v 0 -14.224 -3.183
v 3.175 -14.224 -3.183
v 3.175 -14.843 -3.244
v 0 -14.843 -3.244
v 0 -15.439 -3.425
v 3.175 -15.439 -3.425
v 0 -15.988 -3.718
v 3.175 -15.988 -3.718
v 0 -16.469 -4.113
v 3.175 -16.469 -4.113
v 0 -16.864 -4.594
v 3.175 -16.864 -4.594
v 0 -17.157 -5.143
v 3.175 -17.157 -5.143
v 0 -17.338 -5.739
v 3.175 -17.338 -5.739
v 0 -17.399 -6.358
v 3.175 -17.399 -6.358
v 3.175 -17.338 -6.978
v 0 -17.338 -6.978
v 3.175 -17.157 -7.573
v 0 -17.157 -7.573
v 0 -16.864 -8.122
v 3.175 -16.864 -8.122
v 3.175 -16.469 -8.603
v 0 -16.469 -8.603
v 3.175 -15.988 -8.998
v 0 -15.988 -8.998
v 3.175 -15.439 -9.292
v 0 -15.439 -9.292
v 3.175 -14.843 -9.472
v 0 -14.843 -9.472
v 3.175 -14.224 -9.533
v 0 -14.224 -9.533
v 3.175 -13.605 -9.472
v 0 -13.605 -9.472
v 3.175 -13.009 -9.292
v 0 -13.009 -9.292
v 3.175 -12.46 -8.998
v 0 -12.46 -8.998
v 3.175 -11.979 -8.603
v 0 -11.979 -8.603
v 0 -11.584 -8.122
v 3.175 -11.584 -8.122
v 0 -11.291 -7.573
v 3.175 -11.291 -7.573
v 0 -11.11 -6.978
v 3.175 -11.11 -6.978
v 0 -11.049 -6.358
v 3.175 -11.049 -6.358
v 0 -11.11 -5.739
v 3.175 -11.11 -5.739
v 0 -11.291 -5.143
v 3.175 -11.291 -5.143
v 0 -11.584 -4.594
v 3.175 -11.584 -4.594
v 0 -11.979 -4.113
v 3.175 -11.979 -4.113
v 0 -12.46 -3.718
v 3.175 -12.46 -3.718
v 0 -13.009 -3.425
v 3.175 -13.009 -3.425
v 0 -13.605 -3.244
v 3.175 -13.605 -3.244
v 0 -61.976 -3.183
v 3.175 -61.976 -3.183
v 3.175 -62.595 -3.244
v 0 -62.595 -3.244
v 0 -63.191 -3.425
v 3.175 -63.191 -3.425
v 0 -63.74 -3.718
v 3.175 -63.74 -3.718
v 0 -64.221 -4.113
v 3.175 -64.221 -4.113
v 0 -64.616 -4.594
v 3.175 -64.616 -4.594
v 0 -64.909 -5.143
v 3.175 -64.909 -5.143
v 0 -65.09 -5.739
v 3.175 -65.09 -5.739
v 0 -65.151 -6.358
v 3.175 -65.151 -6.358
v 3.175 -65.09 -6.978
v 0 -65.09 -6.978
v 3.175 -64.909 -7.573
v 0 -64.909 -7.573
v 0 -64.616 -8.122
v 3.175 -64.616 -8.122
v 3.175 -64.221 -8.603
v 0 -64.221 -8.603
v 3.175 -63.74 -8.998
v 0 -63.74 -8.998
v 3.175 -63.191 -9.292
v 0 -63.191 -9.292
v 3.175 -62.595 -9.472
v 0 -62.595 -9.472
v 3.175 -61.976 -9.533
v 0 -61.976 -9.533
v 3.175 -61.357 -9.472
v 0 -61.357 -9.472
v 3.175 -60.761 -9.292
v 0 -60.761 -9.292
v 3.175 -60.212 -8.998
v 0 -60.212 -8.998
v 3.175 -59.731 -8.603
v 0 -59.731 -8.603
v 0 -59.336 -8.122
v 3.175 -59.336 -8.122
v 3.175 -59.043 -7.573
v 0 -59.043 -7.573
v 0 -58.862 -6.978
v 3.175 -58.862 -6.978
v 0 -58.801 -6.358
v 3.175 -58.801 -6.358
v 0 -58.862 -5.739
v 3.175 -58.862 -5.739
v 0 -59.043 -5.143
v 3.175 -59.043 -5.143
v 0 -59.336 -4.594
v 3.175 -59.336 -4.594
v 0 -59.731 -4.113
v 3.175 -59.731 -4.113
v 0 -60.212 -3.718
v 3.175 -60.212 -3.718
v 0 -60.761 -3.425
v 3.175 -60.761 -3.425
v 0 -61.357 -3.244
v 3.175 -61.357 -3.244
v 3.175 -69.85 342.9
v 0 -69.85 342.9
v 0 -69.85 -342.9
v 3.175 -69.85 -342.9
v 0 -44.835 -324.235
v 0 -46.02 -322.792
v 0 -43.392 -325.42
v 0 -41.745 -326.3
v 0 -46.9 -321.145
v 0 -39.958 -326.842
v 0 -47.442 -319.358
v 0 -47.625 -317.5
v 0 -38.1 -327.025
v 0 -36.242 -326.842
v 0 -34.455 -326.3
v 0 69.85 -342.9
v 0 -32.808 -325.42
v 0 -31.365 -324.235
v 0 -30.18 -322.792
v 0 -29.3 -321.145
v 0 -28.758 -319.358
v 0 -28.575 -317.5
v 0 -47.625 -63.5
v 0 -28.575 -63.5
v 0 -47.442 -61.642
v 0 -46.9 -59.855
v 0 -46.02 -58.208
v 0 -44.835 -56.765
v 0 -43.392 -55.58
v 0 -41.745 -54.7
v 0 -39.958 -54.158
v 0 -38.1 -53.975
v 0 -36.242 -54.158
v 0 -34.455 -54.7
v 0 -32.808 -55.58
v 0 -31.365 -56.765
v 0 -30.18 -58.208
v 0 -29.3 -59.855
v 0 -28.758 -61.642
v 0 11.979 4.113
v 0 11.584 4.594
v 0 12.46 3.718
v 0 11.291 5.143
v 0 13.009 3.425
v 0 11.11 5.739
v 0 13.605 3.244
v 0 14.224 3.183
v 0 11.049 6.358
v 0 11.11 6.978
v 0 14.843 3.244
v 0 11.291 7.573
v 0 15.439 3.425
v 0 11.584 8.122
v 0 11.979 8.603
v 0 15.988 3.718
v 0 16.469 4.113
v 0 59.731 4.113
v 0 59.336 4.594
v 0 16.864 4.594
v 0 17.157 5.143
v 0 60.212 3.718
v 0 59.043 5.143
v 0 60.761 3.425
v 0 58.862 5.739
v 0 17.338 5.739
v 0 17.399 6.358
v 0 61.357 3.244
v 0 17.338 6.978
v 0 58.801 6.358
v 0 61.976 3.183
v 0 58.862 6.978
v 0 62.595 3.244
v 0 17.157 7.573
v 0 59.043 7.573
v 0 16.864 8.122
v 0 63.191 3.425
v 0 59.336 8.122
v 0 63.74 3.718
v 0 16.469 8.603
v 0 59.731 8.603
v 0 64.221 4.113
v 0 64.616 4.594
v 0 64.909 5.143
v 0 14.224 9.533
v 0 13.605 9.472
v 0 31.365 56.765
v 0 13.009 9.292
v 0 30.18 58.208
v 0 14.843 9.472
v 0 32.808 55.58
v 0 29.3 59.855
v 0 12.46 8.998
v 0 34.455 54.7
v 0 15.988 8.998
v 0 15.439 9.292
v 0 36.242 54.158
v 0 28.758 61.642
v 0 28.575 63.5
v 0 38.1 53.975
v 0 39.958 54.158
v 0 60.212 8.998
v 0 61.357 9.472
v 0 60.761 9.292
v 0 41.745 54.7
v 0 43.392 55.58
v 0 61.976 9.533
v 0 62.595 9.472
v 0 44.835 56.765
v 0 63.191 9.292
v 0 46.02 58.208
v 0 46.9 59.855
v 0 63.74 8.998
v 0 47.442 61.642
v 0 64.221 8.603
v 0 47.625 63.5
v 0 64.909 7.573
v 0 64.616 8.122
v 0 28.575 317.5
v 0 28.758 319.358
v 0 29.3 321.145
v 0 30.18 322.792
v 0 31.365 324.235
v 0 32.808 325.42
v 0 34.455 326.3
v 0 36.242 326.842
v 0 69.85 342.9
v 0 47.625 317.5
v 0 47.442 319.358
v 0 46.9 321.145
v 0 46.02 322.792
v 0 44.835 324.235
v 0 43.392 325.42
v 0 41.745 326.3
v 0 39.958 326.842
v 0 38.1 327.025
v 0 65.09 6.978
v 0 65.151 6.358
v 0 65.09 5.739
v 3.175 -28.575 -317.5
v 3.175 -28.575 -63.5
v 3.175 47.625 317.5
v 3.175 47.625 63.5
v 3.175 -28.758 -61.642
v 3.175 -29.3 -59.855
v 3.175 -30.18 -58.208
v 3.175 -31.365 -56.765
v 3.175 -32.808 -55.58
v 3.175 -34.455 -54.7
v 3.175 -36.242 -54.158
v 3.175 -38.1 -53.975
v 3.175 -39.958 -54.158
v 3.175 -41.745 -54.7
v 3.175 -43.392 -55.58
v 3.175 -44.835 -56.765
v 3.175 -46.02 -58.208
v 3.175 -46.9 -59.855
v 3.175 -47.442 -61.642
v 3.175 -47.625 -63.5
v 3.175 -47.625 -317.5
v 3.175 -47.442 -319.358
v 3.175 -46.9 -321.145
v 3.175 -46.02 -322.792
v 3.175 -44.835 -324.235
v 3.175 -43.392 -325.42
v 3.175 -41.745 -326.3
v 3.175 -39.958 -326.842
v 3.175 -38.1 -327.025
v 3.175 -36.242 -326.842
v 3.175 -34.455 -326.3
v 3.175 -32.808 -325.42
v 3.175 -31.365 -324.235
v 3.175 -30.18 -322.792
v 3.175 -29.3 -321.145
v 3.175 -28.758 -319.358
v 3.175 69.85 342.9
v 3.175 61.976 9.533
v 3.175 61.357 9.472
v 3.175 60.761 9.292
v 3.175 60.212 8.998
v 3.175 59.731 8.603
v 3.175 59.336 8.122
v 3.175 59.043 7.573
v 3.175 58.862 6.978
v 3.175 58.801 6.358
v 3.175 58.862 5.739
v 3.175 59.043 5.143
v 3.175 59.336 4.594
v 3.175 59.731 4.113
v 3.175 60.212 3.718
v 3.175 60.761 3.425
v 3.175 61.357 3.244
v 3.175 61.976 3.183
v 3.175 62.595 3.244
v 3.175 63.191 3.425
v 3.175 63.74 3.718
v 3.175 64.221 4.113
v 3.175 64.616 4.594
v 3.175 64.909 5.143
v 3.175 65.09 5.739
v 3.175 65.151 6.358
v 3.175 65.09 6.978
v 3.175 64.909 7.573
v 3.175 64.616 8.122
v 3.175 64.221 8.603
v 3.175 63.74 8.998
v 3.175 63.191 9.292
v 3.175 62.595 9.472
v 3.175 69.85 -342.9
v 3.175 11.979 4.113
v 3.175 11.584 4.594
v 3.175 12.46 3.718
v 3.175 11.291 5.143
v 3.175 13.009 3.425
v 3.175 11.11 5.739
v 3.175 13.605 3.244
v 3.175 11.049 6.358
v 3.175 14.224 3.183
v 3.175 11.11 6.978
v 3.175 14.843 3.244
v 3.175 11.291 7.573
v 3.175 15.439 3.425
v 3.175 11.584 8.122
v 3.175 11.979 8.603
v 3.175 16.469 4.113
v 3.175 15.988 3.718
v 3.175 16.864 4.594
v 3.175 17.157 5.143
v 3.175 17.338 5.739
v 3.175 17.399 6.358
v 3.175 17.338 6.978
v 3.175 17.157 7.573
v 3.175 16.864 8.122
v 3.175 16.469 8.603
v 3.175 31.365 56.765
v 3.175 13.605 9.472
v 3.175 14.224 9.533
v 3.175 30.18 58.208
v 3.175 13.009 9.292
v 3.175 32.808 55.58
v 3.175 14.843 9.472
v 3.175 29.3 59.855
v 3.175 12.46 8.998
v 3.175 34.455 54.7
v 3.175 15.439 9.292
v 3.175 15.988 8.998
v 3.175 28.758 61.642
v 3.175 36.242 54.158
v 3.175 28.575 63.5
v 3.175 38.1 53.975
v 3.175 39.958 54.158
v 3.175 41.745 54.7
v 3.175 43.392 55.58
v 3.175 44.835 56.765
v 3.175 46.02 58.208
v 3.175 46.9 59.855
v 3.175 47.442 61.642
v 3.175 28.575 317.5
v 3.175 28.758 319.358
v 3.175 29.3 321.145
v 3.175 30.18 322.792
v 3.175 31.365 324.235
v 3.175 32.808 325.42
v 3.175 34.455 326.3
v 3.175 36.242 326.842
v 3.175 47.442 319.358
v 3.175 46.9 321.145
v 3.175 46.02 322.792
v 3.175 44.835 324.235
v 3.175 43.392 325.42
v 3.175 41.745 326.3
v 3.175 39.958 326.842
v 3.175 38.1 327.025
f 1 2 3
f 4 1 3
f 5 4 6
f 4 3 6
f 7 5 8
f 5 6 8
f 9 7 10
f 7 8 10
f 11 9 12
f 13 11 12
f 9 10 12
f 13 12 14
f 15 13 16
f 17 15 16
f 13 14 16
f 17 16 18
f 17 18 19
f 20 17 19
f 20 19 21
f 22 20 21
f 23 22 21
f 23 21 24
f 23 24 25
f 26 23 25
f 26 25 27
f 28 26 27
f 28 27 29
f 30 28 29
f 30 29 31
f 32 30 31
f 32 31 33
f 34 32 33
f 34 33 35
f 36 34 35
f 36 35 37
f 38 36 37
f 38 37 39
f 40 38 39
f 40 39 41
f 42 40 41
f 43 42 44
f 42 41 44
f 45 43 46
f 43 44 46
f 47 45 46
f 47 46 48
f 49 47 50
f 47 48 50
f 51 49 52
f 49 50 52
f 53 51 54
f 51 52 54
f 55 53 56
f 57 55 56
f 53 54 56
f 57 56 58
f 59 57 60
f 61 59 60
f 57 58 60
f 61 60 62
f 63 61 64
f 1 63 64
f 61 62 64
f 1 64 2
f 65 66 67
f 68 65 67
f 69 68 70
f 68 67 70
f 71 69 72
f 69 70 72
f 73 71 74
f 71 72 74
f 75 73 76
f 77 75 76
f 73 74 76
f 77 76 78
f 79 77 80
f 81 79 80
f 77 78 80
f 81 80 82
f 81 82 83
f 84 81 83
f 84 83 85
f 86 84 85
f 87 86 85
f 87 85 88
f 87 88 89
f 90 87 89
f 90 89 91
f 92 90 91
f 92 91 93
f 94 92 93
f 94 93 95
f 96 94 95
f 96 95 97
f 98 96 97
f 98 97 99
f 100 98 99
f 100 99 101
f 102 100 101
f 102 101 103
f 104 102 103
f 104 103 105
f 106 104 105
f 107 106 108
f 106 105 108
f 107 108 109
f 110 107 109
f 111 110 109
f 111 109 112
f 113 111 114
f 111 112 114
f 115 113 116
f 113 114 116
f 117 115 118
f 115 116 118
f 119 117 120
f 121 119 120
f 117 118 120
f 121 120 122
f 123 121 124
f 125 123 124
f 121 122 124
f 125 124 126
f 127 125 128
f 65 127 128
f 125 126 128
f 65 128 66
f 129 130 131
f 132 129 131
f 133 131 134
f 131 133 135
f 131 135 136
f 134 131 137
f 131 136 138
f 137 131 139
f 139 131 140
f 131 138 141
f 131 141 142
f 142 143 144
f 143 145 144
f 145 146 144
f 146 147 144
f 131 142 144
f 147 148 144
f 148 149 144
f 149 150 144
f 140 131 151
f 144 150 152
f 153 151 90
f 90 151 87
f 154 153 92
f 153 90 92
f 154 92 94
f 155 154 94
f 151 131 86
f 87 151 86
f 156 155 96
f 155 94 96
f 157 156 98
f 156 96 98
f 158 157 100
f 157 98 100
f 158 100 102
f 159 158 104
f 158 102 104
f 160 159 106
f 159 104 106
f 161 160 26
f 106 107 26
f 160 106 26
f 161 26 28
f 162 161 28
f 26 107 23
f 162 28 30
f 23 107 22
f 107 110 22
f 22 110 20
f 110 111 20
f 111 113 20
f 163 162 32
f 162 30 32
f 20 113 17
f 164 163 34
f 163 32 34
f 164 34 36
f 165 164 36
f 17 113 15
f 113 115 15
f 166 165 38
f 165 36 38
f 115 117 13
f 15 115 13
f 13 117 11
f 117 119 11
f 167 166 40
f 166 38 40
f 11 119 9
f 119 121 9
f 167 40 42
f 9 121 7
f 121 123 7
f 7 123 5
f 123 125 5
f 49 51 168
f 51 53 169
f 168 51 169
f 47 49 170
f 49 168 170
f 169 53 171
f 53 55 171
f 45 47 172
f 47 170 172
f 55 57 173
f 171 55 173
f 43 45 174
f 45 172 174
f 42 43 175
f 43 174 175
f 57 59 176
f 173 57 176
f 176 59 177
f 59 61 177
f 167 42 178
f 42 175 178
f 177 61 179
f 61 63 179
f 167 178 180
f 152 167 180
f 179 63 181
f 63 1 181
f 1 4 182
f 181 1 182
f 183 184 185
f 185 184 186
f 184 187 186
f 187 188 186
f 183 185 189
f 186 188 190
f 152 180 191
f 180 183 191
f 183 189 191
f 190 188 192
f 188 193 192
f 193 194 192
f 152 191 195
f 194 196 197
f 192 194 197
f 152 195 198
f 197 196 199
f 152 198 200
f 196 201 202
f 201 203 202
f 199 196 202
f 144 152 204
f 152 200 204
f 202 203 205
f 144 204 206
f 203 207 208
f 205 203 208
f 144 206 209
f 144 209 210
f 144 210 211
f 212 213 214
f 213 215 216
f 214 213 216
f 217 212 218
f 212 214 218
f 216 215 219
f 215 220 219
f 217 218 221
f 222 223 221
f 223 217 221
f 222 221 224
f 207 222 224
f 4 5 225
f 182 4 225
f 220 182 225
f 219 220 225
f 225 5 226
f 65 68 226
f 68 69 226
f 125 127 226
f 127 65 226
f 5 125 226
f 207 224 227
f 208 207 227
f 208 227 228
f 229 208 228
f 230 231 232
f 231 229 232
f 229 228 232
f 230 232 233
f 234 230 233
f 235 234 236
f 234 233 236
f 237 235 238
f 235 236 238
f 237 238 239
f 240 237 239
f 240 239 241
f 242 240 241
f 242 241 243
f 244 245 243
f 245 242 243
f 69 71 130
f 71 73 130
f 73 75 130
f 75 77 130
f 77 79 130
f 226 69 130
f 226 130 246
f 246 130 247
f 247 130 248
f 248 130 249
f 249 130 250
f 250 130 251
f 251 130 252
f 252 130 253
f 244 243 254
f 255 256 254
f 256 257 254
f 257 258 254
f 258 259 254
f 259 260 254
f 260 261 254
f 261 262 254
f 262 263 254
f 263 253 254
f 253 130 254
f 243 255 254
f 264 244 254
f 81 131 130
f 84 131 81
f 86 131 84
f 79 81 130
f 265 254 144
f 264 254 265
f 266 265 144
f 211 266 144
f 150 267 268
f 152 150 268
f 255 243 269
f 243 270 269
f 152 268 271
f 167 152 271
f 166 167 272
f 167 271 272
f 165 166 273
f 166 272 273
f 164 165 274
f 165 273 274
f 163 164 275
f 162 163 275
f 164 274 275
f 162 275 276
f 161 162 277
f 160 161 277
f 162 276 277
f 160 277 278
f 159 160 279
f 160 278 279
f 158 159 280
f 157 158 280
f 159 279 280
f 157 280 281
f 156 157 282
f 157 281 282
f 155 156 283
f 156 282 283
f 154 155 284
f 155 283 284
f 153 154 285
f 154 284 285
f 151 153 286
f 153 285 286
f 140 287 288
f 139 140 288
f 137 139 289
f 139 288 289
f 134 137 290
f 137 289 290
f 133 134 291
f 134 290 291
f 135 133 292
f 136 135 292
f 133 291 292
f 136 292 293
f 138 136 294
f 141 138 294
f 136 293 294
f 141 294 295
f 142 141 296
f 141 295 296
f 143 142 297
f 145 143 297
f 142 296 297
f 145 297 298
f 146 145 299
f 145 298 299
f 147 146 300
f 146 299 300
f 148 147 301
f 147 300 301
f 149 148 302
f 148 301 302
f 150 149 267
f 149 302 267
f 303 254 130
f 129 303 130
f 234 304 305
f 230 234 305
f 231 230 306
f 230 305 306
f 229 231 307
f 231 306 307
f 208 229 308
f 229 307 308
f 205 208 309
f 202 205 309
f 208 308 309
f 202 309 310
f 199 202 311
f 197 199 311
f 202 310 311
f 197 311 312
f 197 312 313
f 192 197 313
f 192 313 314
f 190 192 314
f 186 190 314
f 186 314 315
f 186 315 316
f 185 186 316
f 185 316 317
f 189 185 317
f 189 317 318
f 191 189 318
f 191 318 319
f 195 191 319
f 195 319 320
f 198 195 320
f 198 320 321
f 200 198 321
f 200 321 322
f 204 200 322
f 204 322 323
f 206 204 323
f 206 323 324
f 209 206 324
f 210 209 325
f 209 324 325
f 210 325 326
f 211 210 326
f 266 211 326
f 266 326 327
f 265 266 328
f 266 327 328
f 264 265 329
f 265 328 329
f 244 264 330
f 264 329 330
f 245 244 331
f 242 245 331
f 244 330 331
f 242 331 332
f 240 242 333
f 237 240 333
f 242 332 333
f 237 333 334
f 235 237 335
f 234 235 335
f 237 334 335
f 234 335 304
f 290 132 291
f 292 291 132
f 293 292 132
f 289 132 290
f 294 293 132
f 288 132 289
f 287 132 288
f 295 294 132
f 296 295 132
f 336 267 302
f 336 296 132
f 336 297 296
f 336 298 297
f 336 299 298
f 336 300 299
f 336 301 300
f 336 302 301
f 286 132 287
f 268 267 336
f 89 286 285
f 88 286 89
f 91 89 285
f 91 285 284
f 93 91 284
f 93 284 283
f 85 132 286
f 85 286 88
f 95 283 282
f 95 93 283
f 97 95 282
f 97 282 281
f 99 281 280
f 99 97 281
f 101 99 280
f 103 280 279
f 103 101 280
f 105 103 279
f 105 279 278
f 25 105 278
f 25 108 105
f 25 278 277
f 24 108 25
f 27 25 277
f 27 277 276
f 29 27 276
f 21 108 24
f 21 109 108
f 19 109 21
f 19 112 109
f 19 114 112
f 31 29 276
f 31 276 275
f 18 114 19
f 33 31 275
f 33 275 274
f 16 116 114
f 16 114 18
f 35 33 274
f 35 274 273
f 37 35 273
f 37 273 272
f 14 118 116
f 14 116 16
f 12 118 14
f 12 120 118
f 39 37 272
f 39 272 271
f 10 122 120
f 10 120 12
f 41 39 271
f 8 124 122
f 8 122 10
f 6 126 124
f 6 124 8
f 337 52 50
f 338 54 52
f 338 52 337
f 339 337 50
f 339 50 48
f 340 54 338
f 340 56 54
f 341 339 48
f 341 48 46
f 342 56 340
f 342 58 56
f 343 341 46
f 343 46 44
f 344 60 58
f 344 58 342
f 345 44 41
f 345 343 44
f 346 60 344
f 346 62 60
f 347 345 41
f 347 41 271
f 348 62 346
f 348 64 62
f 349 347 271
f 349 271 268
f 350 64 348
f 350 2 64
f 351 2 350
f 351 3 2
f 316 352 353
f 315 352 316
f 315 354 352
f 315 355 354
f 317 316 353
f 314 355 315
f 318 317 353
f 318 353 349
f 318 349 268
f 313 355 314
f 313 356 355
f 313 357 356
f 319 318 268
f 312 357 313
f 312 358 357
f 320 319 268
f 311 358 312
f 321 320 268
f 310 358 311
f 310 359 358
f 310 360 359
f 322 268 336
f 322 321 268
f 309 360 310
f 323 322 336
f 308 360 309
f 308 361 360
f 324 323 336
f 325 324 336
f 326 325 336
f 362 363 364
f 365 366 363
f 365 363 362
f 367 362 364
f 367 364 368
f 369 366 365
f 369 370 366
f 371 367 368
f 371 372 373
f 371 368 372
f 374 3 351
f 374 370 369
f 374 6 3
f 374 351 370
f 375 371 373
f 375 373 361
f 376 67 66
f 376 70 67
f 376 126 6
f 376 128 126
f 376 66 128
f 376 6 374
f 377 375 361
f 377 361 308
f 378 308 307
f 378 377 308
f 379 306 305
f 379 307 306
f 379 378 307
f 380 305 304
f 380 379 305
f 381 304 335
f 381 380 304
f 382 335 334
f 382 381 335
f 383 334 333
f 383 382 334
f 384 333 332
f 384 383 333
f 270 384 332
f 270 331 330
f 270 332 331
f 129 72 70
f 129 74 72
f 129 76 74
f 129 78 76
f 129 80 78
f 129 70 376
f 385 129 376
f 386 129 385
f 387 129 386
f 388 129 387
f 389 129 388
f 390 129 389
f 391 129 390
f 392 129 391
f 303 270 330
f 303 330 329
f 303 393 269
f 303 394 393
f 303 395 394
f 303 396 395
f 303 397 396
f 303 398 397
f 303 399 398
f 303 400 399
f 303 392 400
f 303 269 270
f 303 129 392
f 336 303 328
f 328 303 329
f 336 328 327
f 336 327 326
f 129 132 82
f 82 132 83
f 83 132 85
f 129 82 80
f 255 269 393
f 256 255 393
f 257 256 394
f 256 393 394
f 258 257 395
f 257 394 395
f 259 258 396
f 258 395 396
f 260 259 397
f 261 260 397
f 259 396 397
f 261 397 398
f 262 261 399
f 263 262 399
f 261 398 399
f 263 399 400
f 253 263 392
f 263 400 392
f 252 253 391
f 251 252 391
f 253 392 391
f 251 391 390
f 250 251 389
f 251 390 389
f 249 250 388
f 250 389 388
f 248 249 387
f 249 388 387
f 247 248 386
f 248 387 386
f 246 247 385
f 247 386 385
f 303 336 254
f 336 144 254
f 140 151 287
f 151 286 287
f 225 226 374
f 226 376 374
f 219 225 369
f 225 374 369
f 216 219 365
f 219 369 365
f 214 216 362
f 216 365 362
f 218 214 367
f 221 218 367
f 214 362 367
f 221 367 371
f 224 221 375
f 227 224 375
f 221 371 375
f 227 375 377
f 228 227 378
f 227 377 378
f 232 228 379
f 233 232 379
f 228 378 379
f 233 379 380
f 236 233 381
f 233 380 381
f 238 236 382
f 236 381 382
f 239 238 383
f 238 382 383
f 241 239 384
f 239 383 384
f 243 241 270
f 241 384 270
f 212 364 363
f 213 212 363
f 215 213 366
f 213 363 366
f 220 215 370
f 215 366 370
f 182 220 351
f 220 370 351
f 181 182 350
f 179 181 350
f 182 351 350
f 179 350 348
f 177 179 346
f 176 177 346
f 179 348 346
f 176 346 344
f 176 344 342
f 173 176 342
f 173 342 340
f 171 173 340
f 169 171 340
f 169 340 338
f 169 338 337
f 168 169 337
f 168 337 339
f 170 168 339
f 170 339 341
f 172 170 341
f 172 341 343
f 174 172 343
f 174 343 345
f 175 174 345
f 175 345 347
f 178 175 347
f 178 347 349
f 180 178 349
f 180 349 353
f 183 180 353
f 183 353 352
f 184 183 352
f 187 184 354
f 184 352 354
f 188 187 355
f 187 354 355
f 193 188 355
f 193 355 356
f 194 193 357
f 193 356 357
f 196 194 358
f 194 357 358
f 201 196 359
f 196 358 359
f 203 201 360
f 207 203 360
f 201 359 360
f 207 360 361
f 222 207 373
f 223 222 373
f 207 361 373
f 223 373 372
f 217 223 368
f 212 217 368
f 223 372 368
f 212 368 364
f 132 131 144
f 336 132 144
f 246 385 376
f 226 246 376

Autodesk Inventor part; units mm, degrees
ref_plane "YZ Plane" through (0, 0, 0) normal (1, 0, 0) x (0, 1, 0)
ref_plane "XZ Plane" through (0, 0, 0) normal (0, 1, 0) x (-1, 0, 0)
ref_plane "XY Plane" through (0, 0, 0) normal (0, 0, 1) x (1, 0, 0)
sketch "Sketch1" plane through (0, 0, 0) normal (1, 0, 0) x (0, 1, 0)
  line L0 (-69.85, 342.9) -> (-69.85, -342.9)
  line L1 (-69.85, -342.9) -> (69.85, -342.9)
  line L2 (69.85, -342.9) -> (69.85, 342.9)
  line L3 (69.85, 342.9) -> (-69.85, 342.9)
  line L4 (-69.85, 342.9) -> (69.85, -342.9) construction
  line L5 (-69.85, -342.9) -> (69.85, 342.9) construction
  point P0 (0, 0)
  dimension "width" = 685.8
  dimension "height" = 139.7
extrude "Extrusion1" add sketch "Sketch1" along normal blind 3.175
sketch "Sketch2" plane through (3.175, 0, 0) normal (1, 0, 0) x (0, 0, -1)
  line L0 (-317.5, 38.1) -> (-63.5, 38.1) construction
  line L1 (-317.5, 28.575) -> (-63.5, 28.575)
  line L2 (-63.5, 47.625) -> (-317.5, 47.625)
  arc A0 (-317.5, 47.625) -> (-317.5, 28.575) centre (-317.5, 38.1) ccw
  arc A1 (-63.5, 28.575) -> (-63.5, 47.625) centre (-63.5, 38.1) ccw
  line L3 (342.9, 69.85) -> (-342.9, 69.85) projected
  line L4 (-342.9, 69.85) -> (-342.9, -69.85) projected
  line L5 (63.5, -38.1) -> (317.5, -38.1) construction
  line L6 (63.5, -47.625) -> (317.5, -47.625)
  line L7 (317.5, -28.575) -> (63.5, -28.575)
  arc A2 (63.5, -28.575) -> (63.5, -47.625) centre (63.5, -38.1) ccw
  arc A3 (317.5, -47.625) -> (317.5, -28.575) centre (317.5, -38.1) ccw
  line L8 (-342.9, -69.85) -> (342.9, -69.85) projected
  line L9 (342.9, -69.85) -> (342.9, 69.85) projected
  point P0 (0, 0)
  point P1 (-190.5, 38.1)
  point P2 (190.5, -38.1)
  dimension "slot_center_from_top" = 31.75
  dimension "slot_center_from_side" = 152.4
  dimension "slot_radius" = 9.525
  dimension "d7" = 31.75
  dimension "d8" = 152.4
  dimension "d9" = 9.525
  dimension "length_of_slot" = 254
  dimension "d13" = 254
extrude "Extrusion2" cut sketch "Sketch2" against normal through all contours A0 L2 A1 L1 | A2 L7 A3 L6
sketch "Sketch3" plane through (0, 0, 0) normal (-1, 0, 0) x (0, 0, 1)
  line L0 (-342.9, 69.85) -> (342.9, 69.85) construction
  line L1 (6.3584, 69.85) -> (6.3584, -72.7678) construction
  line L2 (342.9, 69.85) -> (342.9, -69.85) construction
  line L3 (-6.3584, 69.85) -> (-6.3584, -69.85) construction
  line L4 (-342.9, -69.85) -> (-342.9, 69.85) construction
  line L5 (-6.3584, 61.976) -> (6.3584, 61.976) construction
  line L6 (-6.3584, -61.976) -> (6.3584, -61.976) construction
  line L7 (342.9, -69.85) -> (-342.9, -69.85) construction
  line L8 (-6.3584, 14.224) -> (6.3584, 14.224) construction
  line L9 (-6.3584, -14.224) -> (6.3584, -14.224) construction
  point P0 (0, 0)
  point P1 (80.6051, 237.827)
  point P2 (47.886, -92.9067)
  dimension "Vertical_Line_For_Bolt_Holes" = 336.5416
  dimension "d15" = 336.5416
  dimension "First_Horizontal_Line" = 7.874
  dimension "d17" = 7.874
  dimension "Second_Horizontal_Line" = 47.752
  dimension "d19" = 47.752
hole "Hole1" at (0, 61.976, 6.3584) at (0, -61.976, -6.3584) at (0, 237.827, 80.6051) at (0, -92.9067, 47.886) at (0, 14.224, 6.3584) at (0, -14.224, -6.3584) direction (1, 0, 0) diameter 6.35 end through all
equation "\"d7\" = slot_center_from_top"
equation "\"d8\" = slot_center_from_side"
equation "\"d9\" = slot_radius"
equation "\"d13\" = length_of_slot"
equation "\"d15\" = Vertical_Line_For_Bolt_Holes"
equation "\"d17\" = First_Horizontal_Line"
equation "\"d19\" = Second_Horizontal_Line"
properties part number "5.5 x 27 x 1/8 x 3/8" material "Polyethylene, High Density"
